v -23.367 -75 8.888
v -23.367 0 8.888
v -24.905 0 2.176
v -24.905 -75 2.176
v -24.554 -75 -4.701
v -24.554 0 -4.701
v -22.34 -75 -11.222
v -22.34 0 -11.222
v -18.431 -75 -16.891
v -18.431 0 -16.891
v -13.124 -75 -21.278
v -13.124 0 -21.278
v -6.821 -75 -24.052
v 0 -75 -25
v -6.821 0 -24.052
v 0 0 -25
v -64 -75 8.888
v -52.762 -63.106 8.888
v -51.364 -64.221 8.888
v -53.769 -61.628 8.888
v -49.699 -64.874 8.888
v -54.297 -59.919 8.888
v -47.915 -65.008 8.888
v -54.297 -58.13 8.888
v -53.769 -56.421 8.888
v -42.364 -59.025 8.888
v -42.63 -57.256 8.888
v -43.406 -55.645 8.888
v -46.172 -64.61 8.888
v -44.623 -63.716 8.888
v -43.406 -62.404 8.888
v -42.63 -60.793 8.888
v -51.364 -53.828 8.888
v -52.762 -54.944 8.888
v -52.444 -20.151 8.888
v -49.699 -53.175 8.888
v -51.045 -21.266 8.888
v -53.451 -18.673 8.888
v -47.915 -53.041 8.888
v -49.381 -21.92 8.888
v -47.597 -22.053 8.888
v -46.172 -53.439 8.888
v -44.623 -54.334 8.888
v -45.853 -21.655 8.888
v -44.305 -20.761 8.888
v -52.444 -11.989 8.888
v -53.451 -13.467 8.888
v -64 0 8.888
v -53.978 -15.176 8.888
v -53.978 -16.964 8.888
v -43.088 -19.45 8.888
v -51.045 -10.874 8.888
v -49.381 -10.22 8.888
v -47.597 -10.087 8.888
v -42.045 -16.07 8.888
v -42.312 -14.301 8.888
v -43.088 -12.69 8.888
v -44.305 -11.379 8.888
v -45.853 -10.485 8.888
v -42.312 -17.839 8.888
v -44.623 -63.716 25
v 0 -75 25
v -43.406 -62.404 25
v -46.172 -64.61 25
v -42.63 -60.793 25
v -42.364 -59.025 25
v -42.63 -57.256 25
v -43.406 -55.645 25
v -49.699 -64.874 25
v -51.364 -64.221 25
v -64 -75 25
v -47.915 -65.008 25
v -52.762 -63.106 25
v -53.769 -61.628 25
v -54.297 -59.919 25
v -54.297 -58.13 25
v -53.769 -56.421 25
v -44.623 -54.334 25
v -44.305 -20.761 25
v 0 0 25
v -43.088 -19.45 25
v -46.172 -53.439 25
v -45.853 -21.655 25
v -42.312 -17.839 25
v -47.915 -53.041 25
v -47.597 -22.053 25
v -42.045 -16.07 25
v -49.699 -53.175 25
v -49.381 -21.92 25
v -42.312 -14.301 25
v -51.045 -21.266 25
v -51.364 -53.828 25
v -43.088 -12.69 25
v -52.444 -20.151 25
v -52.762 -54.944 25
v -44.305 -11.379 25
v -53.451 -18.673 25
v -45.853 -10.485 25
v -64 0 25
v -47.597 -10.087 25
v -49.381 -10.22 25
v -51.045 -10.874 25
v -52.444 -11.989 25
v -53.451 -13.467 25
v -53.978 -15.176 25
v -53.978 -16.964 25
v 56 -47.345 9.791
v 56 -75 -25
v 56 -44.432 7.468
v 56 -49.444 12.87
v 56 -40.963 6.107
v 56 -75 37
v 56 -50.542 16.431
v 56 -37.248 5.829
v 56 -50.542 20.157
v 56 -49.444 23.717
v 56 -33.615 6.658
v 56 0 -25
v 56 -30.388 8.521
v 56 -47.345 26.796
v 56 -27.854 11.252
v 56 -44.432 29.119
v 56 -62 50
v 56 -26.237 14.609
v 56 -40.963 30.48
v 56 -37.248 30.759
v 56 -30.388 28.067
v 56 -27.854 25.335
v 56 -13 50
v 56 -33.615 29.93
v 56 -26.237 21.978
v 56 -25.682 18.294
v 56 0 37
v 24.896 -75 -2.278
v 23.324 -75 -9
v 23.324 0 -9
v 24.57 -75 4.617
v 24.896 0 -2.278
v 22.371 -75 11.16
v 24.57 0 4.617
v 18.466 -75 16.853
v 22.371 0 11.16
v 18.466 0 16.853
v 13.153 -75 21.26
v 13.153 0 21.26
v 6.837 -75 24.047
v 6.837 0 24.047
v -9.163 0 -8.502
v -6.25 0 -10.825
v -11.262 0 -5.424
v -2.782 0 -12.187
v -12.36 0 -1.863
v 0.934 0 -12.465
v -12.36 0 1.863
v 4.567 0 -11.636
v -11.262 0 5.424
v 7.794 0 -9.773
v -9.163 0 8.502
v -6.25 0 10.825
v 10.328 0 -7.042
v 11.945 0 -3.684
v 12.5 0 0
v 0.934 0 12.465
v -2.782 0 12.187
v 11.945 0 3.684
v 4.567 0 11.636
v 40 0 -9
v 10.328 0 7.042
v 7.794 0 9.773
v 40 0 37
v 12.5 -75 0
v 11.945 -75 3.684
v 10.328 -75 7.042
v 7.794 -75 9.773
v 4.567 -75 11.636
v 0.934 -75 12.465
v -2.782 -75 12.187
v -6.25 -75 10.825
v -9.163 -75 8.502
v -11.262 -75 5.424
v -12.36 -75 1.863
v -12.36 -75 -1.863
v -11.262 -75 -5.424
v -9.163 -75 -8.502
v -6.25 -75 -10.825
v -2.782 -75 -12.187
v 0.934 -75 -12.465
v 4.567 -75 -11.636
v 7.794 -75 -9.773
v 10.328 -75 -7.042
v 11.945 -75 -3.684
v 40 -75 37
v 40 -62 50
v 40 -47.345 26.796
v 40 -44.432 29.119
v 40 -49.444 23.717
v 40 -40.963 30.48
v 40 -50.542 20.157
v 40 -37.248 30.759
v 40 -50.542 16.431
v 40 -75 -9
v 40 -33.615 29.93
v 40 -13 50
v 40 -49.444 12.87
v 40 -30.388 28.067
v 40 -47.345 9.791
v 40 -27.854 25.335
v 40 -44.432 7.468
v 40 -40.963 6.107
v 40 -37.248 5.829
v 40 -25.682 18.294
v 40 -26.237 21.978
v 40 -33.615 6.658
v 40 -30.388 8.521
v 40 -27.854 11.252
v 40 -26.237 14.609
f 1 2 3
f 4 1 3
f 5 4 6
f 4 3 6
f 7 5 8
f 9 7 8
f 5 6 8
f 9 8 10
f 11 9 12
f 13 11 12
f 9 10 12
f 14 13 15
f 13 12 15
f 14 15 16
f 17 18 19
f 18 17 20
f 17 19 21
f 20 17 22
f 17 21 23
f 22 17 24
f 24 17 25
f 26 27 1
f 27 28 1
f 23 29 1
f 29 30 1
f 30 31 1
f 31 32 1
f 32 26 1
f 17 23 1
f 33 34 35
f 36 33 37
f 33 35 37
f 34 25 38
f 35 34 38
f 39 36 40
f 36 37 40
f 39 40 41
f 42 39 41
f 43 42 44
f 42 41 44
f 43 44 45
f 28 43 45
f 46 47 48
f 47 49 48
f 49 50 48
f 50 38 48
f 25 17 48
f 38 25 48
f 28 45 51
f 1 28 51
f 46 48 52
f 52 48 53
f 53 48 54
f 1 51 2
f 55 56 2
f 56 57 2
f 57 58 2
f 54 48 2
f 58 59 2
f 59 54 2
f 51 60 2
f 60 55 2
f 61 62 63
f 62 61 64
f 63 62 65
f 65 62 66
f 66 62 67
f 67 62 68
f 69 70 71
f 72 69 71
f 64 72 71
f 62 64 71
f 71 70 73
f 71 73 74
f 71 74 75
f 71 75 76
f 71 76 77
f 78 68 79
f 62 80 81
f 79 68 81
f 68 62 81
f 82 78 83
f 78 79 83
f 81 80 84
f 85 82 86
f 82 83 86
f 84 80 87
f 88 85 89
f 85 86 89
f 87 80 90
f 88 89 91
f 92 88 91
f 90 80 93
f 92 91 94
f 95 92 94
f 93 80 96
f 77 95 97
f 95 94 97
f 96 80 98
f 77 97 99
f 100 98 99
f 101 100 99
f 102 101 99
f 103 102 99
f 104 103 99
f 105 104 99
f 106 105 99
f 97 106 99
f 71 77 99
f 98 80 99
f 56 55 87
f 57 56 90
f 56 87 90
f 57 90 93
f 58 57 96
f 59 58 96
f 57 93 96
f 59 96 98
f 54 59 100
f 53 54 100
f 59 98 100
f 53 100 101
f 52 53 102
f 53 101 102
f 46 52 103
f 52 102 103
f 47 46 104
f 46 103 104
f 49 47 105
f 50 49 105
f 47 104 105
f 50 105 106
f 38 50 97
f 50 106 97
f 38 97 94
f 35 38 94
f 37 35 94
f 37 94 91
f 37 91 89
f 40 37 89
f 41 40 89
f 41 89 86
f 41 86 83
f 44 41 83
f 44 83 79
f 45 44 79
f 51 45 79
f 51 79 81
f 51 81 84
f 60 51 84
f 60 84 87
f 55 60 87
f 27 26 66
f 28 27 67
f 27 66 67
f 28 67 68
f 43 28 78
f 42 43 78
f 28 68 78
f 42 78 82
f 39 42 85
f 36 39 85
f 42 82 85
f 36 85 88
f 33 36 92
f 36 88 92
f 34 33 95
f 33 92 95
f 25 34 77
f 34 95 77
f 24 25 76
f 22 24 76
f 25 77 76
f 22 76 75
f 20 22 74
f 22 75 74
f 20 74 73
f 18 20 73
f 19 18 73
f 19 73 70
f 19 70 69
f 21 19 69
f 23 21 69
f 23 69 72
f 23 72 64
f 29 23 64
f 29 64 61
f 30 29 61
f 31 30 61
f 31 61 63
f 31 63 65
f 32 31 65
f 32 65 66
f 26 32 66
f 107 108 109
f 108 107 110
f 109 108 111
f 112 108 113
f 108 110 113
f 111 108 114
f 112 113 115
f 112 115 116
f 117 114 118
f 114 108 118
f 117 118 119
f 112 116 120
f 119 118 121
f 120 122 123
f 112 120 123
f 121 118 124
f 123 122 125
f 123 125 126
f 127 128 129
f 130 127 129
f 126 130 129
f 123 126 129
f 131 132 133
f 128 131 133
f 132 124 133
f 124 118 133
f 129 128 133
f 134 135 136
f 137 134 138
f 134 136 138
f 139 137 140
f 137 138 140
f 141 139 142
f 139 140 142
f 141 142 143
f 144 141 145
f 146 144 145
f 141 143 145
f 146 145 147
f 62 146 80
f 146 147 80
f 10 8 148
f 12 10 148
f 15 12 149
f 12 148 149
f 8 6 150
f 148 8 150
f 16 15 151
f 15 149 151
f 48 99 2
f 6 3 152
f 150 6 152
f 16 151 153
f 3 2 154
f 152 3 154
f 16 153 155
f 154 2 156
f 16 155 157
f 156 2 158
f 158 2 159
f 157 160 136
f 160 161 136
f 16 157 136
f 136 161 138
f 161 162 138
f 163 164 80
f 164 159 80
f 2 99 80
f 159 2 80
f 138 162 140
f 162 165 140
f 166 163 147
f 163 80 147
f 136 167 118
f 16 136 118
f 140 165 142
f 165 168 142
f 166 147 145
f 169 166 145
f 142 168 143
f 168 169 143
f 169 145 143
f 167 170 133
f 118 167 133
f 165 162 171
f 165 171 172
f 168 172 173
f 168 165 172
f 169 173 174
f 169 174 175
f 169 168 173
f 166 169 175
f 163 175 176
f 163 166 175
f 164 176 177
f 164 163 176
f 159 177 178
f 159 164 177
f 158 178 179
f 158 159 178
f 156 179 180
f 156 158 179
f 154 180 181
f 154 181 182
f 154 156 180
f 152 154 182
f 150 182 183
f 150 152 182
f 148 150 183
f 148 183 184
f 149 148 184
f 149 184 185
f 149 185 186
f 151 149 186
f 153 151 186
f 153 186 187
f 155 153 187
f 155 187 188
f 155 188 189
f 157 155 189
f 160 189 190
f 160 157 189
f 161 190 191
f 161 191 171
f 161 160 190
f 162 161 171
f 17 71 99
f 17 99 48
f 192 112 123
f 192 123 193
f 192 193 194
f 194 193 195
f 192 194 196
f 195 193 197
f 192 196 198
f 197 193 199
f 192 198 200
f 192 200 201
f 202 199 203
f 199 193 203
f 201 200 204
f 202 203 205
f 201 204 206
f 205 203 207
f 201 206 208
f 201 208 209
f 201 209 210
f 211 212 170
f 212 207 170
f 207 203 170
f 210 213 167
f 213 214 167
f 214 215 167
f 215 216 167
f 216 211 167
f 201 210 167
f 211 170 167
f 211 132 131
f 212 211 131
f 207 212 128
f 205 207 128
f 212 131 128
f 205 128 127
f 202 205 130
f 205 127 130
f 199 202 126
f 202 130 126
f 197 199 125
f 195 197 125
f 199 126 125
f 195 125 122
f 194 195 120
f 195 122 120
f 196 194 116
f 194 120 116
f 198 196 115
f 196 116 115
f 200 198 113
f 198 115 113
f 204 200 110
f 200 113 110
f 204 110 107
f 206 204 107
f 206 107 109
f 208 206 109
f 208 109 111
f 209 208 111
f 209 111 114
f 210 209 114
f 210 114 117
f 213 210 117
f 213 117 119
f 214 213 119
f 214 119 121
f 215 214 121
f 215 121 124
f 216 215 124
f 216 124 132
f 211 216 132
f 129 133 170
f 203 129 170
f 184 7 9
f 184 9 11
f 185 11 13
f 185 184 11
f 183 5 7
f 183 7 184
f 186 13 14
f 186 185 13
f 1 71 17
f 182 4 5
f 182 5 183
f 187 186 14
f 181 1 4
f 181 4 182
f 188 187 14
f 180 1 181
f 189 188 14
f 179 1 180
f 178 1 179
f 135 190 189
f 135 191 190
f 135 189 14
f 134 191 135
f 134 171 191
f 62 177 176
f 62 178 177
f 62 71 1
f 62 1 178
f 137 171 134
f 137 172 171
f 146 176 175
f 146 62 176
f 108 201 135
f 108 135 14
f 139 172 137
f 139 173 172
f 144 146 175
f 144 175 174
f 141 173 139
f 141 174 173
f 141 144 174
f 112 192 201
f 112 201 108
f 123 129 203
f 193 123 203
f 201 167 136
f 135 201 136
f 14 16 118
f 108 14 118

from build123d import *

# Parameters (mm, degrees)
F0_R     = 12.5
F1_DEPTH = 75
F2_SIZE  = 13
F3_SIZE  = 13
F5_R     = 6
F6_DEPTH = 25
F8_R     = 12.5
F9_DEPTH = 25


with BuildPart() as f1:
    # F0 (on Front) → F1 (new body)
    with BuildSketch(Plane.XZ):
        with BuildLine():
            ThreePointArc((23.323808, -9), (20.615528, 14.142136), (0, 25))
            Line((0, 25), (-64, 25))
            Line((-64, 25), (-64, 8.888163))
            Line((-64, 8.888163), (-23.366655, 8.888163))
            ThreePointArc((-23.366655, 8.888163), (-20.581595, -14.191475), (0, -25))
            Line((0, -25), (56, -25))
            Line((56, -25), (56, 50))
            Line((56, 50), (40, 50))
            Line((40, 50), (40, -9))
            Line((40, -9), (23.323808, -9))
        make_face()
        Circle(F0_R, mode=Mode.SUBTRACT)
    extrude(amount=F1_DEPTH)

    # F2
    f2_edges = [f1.edges().sort_by_distance(p)[0] for p in [
        (48, -75, 50),
    ]]
    chamfer(f2_edges, length=F2_SIZE)

    # F3
    f3_edges = [f1.edges().sort_by_distance(p)[0] for p in [
        (48, 0, 50),
    ]]
    chamfer(f3_edges, length=F3_SIZE)

    # F5 (on face) → F6 (cut)
    with BuildSketch(Plane.XY.offset(25)):
        with Locations((-48.045456, -16.069992)):
            Circle(F5_R)
        with Locations((-48.363637, -59.024539)):
            Circle(F5_R)
    extrude(amount=-F6_DEPTH, mode=Mode.SUBTRACT)

    # F8 (on face) → F9 (cut)
    with BuildSketch(Plane.YZ.offset(56)):
        with Locations((-38.181819, 18.293647)):
            Circle(F8_R)
    extrude(amount=-F9_DEPTH, mode=Mode.SUBTRACT)


solid = f1.part
